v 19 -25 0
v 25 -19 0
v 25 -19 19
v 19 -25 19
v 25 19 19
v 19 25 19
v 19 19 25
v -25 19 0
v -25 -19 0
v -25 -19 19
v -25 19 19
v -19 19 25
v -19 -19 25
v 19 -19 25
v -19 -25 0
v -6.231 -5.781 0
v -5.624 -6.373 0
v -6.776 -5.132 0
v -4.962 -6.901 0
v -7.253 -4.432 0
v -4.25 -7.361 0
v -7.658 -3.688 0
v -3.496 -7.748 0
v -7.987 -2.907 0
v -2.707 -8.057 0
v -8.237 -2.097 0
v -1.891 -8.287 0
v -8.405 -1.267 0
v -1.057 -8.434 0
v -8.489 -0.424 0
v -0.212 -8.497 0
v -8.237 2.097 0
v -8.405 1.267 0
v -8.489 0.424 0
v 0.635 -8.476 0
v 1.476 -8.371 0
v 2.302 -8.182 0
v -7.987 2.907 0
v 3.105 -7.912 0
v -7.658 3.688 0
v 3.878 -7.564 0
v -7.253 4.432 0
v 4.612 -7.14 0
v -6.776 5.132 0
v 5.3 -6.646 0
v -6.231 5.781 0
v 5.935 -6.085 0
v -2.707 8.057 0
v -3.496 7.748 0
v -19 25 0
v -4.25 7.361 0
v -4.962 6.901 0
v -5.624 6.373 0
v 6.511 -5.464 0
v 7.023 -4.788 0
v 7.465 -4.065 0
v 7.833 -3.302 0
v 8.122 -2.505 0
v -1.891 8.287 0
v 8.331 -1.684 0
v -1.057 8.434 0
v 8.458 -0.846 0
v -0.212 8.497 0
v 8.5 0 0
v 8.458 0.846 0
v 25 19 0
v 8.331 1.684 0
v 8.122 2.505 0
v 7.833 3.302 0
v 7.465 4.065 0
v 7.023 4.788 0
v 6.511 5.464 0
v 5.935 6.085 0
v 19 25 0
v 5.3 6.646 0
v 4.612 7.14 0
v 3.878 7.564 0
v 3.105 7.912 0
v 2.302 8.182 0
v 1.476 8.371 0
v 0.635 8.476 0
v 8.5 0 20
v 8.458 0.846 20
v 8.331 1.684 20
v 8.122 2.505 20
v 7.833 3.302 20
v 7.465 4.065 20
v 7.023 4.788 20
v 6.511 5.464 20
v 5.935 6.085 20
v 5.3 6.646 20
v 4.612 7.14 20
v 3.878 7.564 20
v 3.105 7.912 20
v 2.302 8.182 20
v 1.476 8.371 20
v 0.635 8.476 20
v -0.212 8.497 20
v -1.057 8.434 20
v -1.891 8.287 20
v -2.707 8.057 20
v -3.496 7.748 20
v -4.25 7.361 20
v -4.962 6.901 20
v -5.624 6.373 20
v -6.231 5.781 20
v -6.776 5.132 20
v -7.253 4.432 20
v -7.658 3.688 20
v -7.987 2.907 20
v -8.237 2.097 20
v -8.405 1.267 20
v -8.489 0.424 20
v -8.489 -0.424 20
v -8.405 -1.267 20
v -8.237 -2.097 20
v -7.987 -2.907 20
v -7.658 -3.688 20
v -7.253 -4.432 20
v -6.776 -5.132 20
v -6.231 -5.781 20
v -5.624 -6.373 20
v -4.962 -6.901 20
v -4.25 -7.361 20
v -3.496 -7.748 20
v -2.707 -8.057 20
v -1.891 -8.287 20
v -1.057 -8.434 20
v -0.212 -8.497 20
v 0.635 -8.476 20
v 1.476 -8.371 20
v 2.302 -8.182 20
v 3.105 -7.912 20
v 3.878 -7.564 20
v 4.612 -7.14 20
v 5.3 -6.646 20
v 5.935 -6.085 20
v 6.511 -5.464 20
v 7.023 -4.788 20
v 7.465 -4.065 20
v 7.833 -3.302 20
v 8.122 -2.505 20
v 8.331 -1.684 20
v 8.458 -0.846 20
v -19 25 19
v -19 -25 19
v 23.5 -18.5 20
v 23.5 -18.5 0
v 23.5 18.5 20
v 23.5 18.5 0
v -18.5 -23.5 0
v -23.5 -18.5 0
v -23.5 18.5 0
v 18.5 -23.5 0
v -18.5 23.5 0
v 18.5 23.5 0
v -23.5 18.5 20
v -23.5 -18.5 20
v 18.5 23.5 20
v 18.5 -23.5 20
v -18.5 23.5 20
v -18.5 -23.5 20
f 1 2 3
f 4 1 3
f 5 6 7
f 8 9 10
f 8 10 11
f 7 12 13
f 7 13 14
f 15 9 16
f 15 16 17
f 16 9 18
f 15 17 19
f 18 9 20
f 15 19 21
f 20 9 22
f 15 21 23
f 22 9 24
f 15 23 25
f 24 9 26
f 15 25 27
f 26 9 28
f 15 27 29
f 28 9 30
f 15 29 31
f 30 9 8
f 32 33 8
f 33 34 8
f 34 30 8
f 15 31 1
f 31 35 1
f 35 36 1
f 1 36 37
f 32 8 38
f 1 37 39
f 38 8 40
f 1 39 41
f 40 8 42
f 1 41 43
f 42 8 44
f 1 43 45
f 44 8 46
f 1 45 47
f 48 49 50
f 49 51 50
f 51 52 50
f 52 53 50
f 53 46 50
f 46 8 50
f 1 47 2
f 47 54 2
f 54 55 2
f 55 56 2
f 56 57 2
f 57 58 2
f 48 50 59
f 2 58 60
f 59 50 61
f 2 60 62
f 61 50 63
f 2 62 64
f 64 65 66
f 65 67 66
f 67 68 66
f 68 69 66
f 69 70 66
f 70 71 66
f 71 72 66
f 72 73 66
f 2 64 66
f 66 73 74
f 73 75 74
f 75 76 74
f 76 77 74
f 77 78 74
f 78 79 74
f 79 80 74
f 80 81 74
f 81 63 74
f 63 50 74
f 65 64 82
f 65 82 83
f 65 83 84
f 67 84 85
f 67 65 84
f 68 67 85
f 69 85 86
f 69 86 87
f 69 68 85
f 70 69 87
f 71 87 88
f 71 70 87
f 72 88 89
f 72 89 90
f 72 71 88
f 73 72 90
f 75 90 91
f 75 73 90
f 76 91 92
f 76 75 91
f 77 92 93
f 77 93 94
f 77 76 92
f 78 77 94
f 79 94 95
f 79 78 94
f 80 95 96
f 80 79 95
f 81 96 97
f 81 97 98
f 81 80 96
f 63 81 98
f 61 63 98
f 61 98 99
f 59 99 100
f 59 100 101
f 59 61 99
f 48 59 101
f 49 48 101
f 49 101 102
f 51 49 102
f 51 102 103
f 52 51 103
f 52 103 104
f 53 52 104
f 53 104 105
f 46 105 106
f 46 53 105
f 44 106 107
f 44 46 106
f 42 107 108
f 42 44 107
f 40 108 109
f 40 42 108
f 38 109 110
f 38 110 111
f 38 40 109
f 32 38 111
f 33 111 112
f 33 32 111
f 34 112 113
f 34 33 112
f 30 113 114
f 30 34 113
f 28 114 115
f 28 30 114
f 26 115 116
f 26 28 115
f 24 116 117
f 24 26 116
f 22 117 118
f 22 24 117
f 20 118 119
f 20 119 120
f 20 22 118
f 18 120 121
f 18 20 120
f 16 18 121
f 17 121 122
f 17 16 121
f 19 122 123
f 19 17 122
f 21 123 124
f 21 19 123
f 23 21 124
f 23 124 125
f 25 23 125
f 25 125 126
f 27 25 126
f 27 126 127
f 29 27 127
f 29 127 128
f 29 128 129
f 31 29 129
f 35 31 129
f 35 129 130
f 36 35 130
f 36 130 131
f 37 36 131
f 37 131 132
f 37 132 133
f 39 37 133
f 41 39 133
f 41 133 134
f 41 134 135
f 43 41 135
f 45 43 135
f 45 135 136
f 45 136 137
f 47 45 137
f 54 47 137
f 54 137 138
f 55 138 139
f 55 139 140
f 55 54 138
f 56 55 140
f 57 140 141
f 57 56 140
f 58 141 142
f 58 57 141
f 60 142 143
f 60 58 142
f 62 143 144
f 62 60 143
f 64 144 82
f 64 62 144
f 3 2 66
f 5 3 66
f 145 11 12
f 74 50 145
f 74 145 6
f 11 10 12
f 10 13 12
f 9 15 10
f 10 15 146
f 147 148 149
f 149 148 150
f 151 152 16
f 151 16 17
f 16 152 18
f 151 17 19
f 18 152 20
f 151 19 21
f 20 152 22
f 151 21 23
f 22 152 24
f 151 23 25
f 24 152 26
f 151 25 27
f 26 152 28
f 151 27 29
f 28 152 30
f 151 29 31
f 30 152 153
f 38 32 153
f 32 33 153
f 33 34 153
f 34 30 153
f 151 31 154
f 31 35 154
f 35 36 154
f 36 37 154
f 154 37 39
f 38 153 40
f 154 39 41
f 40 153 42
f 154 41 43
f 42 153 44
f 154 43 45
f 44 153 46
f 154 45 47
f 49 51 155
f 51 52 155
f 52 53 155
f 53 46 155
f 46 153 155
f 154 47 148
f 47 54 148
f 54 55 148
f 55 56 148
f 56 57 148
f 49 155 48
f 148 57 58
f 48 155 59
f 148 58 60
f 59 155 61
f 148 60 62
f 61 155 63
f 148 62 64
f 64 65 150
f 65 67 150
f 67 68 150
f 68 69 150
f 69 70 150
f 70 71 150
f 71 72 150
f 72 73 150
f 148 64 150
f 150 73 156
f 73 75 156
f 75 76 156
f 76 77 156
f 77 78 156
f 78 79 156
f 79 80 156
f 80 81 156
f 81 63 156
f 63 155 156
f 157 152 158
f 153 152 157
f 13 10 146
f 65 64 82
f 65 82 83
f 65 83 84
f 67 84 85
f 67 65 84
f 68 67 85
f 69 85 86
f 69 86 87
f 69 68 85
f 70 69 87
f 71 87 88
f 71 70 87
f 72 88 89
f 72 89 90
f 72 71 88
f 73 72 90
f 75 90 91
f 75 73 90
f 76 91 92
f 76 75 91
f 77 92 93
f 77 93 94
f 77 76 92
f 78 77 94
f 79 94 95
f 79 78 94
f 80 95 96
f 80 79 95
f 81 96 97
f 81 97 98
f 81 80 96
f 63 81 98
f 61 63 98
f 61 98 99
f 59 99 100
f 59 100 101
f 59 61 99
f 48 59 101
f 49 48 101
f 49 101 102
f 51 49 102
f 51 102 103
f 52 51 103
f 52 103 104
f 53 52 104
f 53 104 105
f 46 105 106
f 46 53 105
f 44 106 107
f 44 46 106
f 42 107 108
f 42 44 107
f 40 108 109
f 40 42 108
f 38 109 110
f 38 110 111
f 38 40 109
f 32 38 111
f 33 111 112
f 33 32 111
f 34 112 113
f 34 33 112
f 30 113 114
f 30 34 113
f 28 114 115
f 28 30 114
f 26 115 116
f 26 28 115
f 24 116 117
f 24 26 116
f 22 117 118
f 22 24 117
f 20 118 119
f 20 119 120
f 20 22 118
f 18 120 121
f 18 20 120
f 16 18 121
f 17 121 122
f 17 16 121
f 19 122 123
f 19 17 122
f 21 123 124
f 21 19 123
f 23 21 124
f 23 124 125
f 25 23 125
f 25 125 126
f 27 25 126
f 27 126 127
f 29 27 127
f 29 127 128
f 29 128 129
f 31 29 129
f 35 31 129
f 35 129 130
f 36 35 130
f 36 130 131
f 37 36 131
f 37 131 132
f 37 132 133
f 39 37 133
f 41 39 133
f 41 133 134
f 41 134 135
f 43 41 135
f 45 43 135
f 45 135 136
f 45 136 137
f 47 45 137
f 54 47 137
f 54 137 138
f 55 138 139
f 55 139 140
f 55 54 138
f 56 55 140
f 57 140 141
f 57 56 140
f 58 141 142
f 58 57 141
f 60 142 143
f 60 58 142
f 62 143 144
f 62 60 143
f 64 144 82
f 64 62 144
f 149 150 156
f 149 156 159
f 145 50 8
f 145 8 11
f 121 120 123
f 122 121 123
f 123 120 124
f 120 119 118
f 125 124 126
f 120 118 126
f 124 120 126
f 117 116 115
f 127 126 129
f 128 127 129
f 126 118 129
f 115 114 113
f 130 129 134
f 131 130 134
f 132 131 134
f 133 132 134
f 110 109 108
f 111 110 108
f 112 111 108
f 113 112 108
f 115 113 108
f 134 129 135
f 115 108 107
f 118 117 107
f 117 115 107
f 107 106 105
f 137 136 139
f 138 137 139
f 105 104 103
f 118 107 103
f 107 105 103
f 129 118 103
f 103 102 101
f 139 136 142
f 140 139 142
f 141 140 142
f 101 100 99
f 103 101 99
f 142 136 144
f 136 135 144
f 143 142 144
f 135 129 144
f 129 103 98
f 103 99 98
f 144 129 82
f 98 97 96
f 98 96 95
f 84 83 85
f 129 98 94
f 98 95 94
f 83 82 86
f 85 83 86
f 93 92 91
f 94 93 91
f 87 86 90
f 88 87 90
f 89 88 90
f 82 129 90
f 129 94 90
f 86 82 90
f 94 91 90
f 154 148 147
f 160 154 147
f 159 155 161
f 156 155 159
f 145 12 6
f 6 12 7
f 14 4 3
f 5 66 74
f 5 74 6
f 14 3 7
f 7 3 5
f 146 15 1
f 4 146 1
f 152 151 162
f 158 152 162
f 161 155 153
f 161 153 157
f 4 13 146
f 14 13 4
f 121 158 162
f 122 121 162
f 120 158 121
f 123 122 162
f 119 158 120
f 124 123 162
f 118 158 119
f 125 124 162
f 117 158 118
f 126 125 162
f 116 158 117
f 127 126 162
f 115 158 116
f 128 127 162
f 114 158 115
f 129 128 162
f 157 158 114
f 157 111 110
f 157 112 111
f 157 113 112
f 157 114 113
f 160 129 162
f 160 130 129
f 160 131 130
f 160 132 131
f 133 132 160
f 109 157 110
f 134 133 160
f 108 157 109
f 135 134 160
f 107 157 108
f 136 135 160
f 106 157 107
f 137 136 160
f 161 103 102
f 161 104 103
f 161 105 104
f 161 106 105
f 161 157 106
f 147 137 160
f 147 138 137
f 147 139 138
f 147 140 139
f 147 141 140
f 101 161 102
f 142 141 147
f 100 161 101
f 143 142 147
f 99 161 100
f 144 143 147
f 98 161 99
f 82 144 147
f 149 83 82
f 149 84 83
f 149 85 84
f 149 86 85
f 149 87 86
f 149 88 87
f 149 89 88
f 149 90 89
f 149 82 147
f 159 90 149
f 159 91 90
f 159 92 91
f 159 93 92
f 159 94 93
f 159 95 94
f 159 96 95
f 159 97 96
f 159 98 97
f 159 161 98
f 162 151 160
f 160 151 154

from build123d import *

# Parameters (mm, degrees)
F1_W     = 50
F1_H     = 50
F3_DEPTH = 25
F0_W     = 47
F0_H     = 47
F0_R     = 8.5
F4_DEPTH = 20
F2_R     = 8.5
F5_DEPTH = 20
F6_SIZE  = 6
F7_SIZE  = 5


with BuildPart() as f3:
    # F1 (on Top) → F3 (new body)
    with BuildSketch(Plane.XY):
        Rectangle(F1_W, F1_H)
    extrude(amount=F3_DEPTH)

    # F2 (on Top) → F5 (cut)
    with BuildSketch(Plane.XY):
        Circle(F2_R)
    extrude(amount=F5_DEPTH, mode=Mode.SUBTRACT)

    # F6
    f6_edges = [f3.edges().sort_by_distance(p)[0] for p in [
        (-25, 25, 12.5),
        (-25, 0, 25),
        (-25, -25, 12.5),
        (25, -25, 12.5),
        (25, 25, 12.5),
        (0, 25, 25),
        (0, -25, 25),
        (25, 0, 25),
    ]]
    chamfer(f6_edges, length=F6_SIZE)


with BuildPart() as f4:
    # F0 (on Top) → F4 (new body)
    with BuildSketch(Plane.XY):
        Rectangle(F0_W, F0_H)
        Circle(F0_R, mode=Mode.SUBTRACT)
    extrude(amount=F4_DEPTH)

    # F7
    f7_edges = [f4.edges().sort_by_distance(p)[0] for p in [
        (23.5, 23.5, 10),
        (-23.5, 23.5, 10),
        (-23.5, -23.5, 10),
        (23.5, -23.5, 10),
    ]]
    chamfer(f7_edges, length=F7_SIZE)


solid = Compound([f3.part, f4.part])
